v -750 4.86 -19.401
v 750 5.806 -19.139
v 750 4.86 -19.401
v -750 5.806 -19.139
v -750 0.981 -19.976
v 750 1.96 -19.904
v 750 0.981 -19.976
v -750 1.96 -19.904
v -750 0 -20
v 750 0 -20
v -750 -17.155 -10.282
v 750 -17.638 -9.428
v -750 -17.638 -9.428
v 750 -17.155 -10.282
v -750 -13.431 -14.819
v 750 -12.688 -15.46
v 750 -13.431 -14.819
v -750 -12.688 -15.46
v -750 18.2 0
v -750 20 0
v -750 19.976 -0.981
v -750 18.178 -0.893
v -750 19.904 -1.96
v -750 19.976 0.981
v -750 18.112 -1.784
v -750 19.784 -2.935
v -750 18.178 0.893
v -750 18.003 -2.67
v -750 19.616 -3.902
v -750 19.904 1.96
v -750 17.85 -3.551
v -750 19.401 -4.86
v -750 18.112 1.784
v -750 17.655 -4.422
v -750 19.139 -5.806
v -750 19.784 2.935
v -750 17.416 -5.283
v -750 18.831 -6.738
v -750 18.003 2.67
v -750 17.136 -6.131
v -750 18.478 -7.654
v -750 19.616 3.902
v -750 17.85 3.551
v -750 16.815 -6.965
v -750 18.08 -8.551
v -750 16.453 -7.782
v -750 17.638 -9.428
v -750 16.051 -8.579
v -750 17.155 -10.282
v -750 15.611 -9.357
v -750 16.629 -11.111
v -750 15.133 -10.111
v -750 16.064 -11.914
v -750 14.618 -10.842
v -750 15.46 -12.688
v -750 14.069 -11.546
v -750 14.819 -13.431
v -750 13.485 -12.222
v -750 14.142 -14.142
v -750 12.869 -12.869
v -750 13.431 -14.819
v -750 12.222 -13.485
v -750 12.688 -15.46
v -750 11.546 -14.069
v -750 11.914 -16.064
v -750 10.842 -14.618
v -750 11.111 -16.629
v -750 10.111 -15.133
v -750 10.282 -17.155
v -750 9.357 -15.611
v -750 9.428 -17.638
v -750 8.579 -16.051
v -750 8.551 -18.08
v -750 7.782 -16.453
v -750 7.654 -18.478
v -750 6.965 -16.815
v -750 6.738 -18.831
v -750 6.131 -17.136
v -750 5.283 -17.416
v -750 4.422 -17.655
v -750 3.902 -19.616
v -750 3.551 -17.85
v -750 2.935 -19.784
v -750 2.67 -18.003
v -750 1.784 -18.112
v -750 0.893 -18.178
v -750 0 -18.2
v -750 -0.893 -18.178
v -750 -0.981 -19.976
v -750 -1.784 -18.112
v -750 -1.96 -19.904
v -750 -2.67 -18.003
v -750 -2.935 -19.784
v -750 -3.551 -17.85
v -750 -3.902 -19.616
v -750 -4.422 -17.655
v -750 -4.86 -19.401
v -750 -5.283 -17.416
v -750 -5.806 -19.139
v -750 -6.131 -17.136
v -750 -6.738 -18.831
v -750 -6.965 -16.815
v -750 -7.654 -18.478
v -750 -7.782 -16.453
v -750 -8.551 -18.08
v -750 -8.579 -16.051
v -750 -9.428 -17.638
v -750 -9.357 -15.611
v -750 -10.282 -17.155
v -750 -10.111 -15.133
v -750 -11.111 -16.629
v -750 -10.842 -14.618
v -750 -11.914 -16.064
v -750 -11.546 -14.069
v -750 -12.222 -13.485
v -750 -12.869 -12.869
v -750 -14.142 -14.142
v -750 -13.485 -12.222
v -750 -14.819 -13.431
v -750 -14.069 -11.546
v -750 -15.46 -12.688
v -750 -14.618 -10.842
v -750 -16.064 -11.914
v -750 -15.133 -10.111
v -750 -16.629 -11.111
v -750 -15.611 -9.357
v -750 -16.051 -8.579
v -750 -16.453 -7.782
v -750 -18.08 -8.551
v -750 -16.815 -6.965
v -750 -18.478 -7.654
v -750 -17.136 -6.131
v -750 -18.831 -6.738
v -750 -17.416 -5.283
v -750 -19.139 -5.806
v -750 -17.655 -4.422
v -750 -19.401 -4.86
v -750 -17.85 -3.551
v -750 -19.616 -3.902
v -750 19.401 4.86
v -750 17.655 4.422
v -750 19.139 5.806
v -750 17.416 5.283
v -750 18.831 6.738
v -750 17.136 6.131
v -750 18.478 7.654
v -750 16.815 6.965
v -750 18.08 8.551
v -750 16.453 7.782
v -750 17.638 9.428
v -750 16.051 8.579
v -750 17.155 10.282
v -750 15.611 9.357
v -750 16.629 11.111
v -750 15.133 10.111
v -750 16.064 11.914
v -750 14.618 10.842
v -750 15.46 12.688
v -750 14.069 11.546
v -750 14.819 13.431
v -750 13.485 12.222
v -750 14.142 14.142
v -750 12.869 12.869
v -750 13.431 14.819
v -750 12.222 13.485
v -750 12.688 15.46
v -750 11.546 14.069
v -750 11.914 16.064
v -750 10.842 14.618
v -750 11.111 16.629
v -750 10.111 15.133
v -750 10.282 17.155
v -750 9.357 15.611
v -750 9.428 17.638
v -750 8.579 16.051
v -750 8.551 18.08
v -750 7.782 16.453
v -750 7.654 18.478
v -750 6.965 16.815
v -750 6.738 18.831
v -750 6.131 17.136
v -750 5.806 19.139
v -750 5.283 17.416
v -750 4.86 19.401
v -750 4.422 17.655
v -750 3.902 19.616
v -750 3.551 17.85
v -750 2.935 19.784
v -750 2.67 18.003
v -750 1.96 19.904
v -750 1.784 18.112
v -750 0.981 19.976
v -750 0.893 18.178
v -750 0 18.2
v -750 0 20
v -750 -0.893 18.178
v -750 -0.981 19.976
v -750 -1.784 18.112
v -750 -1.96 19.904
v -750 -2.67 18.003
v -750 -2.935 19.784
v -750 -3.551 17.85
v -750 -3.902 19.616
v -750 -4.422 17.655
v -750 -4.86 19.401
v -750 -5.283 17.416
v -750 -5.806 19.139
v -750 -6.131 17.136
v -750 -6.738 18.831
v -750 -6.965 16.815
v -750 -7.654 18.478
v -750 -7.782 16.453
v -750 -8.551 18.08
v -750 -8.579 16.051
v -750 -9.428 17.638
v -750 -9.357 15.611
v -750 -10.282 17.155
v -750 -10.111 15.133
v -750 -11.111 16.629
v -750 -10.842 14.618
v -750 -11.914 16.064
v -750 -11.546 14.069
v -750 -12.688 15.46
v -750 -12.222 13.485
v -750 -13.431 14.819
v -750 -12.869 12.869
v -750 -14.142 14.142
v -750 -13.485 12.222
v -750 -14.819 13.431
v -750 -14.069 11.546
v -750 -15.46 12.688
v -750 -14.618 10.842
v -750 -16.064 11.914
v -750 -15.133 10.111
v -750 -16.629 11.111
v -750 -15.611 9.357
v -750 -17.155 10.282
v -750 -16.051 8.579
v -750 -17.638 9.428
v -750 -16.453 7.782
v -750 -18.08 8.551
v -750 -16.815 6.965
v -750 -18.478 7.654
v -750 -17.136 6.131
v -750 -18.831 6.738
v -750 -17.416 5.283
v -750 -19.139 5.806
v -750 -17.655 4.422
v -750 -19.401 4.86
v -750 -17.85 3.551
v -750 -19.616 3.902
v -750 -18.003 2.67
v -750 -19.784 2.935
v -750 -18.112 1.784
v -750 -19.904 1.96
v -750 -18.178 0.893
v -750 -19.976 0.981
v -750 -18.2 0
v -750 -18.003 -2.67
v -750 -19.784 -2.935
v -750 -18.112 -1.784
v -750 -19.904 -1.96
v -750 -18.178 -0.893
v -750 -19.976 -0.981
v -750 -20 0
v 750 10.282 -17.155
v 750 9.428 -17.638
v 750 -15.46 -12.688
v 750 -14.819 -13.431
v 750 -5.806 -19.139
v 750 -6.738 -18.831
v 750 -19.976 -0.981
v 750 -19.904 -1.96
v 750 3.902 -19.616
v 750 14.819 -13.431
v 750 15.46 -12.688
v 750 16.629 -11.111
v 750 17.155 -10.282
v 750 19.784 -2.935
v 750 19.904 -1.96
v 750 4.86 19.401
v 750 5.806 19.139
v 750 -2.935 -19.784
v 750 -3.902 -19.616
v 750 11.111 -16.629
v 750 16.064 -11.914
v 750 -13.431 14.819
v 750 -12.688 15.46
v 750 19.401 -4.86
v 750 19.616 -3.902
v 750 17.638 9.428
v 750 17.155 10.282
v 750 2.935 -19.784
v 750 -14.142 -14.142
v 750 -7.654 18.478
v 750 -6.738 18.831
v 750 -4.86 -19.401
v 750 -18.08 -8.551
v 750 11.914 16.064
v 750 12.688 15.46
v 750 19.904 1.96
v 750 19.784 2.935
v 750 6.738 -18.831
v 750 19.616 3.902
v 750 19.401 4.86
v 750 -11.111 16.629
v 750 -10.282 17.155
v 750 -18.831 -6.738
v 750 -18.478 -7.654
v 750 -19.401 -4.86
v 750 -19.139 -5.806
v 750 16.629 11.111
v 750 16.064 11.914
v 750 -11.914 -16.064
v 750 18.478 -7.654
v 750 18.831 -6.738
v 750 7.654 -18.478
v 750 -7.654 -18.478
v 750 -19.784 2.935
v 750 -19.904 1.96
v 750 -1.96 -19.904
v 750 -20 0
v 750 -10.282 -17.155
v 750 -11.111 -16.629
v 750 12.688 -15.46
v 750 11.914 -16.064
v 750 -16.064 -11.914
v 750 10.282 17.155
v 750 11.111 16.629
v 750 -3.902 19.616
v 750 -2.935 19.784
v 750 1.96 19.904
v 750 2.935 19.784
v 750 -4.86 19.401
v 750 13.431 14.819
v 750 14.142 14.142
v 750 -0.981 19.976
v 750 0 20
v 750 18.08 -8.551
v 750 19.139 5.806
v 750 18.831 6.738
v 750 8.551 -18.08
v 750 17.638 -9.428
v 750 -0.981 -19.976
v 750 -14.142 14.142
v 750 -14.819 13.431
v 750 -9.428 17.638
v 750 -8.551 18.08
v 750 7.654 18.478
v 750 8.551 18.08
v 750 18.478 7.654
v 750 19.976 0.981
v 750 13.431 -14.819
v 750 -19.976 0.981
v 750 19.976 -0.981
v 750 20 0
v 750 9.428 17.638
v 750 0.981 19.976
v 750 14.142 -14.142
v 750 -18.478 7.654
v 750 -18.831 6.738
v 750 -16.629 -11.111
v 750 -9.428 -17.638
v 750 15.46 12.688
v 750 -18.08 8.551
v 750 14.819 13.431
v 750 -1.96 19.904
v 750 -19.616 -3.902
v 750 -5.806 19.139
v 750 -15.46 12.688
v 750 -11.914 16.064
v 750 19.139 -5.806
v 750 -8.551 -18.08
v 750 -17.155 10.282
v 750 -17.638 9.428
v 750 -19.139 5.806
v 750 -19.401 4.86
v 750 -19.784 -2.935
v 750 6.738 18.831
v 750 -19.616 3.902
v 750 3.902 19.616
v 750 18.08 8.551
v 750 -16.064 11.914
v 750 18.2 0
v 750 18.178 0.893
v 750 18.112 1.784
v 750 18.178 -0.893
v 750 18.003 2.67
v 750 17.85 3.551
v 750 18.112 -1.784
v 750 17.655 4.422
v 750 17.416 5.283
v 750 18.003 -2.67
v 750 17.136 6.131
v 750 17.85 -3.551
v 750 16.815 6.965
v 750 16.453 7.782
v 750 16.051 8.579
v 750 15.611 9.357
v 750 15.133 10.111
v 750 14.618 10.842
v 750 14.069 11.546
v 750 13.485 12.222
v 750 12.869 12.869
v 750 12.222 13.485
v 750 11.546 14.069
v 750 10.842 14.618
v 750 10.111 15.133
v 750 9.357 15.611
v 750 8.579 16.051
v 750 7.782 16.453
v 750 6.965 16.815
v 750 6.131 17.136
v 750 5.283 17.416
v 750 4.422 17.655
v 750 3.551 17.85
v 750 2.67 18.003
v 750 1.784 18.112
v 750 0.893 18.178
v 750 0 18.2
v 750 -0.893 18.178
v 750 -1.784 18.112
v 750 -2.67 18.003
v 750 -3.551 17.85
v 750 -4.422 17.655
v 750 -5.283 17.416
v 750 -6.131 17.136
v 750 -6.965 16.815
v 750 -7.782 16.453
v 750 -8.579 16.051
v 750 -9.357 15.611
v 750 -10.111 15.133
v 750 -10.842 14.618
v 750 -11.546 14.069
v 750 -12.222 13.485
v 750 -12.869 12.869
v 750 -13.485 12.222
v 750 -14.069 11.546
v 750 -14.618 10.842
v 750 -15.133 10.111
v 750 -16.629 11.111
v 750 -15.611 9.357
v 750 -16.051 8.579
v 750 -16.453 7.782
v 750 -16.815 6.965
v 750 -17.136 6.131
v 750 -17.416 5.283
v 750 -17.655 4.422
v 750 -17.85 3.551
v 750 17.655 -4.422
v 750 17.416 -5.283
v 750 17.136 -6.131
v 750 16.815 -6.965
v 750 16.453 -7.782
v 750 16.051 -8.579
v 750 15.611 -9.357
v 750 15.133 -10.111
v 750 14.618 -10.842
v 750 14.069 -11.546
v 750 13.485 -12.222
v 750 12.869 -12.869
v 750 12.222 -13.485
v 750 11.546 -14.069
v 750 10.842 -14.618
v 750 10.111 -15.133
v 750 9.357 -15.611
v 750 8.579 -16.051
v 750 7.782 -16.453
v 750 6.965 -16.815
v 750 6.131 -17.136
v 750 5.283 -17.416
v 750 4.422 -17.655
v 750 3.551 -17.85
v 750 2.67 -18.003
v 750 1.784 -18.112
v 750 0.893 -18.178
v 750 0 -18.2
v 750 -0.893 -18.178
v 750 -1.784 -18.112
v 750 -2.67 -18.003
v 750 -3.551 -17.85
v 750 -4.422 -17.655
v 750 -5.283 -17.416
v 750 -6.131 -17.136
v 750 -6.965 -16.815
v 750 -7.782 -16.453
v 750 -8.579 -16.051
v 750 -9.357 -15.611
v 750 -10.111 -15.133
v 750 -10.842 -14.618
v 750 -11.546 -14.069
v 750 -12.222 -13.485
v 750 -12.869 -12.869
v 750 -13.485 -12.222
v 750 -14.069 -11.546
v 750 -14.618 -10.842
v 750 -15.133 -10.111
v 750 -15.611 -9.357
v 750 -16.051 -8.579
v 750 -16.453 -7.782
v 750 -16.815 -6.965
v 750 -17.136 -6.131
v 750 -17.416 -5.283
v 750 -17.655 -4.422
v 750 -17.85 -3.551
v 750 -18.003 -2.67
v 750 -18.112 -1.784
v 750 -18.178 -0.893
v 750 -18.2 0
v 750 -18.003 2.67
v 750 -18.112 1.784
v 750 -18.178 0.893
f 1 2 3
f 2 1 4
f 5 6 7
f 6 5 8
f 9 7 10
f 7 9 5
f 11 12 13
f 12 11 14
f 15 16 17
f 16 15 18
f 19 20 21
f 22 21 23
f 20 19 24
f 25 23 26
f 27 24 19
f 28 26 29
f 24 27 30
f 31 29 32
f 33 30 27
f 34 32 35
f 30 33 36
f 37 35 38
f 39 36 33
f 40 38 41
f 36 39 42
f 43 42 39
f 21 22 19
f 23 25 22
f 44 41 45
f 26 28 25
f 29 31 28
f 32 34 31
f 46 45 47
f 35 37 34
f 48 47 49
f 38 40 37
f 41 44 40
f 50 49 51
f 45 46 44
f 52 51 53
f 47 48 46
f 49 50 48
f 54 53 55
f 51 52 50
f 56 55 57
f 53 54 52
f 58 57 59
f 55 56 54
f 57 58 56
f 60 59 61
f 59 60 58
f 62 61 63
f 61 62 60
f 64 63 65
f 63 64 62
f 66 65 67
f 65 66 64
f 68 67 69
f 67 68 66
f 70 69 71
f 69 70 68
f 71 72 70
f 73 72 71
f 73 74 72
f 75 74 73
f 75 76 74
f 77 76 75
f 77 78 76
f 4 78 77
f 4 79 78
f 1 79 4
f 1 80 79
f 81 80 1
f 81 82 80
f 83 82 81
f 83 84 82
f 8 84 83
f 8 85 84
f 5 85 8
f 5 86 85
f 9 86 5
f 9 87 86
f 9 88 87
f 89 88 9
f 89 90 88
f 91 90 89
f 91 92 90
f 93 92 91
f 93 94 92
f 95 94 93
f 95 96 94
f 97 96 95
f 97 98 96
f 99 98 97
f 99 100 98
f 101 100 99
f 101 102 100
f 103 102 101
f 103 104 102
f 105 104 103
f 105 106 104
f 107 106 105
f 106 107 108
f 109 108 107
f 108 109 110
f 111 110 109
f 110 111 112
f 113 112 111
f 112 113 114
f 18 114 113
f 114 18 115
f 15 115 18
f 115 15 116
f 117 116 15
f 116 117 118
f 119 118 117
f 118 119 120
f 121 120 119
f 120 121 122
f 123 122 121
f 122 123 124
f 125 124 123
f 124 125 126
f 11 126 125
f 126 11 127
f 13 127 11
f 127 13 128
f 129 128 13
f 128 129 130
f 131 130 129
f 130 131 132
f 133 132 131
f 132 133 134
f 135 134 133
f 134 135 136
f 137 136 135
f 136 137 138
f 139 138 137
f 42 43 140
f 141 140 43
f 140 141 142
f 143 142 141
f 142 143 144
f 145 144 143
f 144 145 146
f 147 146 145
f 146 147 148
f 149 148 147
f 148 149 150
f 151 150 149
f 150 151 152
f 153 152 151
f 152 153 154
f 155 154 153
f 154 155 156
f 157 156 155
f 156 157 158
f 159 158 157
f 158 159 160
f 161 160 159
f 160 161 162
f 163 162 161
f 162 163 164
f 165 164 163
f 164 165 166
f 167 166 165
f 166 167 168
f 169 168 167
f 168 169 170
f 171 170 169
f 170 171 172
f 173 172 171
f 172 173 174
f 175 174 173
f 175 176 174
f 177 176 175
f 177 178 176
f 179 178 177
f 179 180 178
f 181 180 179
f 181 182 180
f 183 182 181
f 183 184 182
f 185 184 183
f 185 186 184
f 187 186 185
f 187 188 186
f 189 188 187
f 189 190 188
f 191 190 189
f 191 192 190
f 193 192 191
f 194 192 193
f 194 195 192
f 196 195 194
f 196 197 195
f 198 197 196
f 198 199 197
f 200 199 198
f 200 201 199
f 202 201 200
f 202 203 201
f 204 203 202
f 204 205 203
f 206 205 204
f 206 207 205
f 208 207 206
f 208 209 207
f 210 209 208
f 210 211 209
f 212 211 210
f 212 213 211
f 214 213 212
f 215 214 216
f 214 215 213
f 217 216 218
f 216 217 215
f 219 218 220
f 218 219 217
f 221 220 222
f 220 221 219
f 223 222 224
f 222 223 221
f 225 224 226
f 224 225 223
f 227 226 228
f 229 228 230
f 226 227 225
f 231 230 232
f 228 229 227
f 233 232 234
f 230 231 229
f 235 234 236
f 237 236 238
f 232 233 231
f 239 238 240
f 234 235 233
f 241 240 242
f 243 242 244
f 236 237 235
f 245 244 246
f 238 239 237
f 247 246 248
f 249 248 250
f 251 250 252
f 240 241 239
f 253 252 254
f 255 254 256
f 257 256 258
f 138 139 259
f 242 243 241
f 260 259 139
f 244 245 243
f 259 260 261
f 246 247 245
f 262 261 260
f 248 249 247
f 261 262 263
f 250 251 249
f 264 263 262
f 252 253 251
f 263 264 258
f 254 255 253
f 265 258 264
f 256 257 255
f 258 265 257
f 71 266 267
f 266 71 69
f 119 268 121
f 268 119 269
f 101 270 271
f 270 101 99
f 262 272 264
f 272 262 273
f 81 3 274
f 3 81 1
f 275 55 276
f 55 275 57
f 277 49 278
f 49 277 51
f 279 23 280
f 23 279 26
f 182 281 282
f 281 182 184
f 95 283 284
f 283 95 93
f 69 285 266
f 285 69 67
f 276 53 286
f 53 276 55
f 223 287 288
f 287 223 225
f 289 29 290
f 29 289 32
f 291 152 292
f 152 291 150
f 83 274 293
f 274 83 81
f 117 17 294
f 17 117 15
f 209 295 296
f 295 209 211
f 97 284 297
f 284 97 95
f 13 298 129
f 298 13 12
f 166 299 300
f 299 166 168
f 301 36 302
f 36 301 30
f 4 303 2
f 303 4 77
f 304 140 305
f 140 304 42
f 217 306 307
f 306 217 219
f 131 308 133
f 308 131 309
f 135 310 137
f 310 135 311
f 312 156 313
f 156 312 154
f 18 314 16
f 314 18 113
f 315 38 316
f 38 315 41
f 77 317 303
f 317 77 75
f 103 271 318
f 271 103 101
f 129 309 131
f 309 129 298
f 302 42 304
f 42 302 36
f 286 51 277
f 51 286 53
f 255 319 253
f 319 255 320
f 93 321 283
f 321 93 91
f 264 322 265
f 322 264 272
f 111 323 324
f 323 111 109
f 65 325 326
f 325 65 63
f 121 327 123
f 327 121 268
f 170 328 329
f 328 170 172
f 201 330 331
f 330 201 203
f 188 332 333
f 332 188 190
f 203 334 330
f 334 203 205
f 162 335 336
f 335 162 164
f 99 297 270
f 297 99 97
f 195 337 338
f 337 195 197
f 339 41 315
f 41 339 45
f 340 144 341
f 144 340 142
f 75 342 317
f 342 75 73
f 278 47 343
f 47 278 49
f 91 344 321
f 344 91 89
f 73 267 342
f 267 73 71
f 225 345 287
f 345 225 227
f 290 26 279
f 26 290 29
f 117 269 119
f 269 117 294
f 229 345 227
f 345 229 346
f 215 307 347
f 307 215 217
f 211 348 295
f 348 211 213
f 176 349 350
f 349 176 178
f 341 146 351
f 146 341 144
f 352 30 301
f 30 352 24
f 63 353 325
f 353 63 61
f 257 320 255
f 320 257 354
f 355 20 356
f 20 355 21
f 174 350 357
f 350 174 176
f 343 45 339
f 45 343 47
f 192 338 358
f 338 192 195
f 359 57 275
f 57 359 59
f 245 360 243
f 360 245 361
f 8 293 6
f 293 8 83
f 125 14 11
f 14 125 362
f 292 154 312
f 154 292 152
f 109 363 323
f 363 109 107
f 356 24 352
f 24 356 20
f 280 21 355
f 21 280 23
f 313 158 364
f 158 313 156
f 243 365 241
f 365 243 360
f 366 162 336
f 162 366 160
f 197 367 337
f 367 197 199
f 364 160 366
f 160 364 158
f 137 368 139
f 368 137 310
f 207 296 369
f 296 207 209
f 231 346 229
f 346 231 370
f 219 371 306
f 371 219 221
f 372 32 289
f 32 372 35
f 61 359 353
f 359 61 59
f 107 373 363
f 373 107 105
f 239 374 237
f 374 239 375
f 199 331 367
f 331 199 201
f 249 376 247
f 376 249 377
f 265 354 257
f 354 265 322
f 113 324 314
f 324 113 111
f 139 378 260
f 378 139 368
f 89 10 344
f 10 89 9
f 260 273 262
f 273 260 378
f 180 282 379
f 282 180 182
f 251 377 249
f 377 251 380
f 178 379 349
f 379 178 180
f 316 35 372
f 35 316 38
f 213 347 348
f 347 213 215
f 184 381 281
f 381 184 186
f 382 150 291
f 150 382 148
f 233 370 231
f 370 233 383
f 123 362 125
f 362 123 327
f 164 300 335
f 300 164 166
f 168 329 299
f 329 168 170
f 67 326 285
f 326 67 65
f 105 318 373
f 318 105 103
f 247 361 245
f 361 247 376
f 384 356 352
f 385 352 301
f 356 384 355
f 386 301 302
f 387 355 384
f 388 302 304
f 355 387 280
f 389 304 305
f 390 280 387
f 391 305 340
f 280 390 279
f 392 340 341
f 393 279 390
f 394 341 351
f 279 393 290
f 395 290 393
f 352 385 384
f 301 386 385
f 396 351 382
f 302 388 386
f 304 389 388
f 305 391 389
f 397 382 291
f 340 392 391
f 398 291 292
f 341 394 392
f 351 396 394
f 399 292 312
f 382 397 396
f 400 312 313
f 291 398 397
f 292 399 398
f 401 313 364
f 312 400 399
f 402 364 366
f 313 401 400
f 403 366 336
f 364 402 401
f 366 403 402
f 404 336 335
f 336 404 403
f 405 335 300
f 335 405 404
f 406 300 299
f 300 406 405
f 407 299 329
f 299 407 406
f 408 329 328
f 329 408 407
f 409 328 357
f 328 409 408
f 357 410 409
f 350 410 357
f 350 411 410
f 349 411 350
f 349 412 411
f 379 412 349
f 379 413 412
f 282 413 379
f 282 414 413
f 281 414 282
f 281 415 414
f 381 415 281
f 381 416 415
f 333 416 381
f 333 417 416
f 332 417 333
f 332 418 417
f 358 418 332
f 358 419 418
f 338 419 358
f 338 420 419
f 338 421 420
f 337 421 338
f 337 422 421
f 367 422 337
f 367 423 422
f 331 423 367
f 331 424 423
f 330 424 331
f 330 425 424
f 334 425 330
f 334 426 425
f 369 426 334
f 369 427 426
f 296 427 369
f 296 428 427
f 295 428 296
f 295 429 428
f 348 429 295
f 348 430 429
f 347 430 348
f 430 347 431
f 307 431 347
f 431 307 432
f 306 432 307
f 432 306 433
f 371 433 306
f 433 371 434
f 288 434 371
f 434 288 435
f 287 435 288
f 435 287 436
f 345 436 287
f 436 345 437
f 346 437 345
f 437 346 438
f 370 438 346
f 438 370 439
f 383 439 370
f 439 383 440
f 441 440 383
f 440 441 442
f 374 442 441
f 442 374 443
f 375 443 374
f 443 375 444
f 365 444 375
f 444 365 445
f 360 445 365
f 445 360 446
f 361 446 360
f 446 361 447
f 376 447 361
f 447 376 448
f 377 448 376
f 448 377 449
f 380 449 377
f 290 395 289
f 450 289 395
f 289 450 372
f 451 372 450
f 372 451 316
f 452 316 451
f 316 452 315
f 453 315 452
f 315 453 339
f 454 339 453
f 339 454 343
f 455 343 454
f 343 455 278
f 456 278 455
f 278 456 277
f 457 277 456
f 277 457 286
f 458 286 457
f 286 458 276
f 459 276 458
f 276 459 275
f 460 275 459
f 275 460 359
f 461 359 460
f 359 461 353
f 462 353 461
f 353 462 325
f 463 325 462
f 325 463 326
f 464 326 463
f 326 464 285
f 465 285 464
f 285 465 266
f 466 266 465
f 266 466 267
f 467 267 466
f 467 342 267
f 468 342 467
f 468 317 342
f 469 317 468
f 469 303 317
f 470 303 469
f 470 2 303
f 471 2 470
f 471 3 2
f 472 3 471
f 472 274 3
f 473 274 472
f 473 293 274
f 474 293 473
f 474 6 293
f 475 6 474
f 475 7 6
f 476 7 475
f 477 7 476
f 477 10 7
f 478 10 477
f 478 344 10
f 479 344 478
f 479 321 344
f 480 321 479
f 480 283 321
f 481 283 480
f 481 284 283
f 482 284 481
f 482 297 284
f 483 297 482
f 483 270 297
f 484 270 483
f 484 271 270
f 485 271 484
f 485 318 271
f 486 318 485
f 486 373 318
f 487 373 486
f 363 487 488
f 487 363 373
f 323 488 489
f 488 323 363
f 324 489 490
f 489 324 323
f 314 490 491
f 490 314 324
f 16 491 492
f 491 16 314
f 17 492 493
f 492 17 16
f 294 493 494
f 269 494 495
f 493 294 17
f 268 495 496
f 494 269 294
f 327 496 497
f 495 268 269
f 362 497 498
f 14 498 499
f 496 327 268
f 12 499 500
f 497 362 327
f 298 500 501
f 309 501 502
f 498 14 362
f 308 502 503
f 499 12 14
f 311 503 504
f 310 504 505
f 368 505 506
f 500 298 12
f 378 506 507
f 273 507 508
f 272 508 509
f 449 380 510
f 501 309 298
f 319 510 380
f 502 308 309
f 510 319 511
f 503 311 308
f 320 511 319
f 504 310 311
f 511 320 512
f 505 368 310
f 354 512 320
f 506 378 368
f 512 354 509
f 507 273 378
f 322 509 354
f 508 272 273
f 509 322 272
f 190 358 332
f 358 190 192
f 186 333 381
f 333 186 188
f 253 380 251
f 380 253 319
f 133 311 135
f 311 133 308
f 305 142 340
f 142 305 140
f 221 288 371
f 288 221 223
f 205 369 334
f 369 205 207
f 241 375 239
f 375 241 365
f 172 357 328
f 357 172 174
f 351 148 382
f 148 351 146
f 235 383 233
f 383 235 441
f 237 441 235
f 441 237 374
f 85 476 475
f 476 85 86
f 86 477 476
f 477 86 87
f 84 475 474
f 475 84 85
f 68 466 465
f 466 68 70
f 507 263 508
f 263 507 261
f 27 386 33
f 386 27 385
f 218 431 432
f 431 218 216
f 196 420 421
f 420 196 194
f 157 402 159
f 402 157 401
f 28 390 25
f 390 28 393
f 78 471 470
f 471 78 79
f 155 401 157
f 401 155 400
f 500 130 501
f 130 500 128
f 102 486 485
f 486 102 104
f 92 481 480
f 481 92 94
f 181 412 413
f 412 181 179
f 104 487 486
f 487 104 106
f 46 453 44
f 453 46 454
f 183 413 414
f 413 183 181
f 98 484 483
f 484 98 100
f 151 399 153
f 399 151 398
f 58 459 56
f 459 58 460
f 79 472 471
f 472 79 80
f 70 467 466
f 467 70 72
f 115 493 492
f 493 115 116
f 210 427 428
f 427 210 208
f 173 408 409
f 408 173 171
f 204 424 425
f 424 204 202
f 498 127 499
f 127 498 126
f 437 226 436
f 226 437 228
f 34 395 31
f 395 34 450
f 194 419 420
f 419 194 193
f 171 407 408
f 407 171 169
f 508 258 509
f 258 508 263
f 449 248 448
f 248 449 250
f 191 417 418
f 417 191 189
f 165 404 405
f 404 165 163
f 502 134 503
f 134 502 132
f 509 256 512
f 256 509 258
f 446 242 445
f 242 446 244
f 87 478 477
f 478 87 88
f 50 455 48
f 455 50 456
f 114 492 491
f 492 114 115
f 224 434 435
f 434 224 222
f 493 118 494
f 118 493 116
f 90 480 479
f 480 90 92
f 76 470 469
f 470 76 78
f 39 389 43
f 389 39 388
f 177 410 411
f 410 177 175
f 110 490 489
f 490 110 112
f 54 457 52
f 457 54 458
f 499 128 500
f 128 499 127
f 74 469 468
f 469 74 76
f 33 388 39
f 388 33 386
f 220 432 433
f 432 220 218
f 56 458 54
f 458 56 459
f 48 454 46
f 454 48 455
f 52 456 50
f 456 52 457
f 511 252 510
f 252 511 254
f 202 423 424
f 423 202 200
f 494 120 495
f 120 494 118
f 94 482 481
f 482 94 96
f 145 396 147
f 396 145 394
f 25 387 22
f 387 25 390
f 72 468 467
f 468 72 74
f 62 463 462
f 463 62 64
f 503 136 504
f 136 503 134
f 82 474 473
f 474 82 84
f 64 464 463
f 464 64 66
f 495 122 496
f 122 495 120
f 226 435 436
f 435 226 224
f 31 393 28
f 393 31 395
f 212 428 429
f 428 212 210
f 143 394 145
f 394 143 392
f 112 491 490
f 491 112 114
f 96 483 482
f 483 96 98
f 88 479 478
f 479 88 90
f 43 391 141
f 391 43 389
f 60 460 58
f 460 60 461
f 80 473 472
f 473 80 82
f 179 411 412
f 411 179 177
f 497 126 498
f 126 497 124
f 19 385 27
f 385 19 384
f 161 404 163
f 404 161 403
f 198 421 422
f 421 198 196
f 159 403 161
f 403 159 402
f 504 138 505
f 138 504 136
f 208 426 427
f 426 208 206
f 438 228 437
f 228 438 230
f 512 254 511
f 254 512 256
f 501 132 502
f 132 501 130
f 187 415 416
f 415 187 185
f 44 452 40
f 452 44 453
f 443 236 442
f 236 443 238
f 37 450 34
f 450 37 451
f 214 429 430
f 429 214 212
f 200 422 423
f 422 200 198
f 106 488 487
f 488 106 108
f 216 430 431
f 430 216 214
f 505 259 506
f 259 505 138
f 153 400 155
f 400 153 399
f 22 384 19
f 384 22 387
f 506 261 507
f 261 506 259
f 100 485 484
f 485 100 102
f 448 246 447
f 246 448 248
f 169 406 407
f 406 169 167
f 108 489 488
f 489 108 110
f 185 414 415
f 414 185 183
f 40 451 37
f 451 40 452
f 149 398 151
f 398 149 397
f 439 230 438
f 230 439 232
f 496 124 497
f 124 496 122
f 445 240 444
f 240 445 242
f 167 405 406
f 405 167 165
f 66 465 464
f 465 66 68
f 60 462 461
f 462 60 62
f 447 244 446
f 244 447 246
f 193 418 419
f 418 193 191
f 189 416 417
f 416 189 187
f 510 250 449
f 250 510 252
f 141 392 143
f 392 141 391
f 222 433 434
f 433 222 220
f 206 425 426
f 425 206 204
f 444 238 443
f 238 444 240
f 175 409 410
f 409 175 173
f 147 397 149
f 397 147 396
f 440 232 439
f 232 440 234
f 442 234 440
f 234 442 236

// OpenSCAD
$fn = 128;

// HT 40 pipe (approx.): OD 40 mm, wall 1.8 mm, length 1500 mm
od = 40;
wall = 1.8;
len = 1500;

module ht_pipe(od, wall, len) {
    eps = 0.2; // overlap to avoid coplanar artifacts
    id = od - 2*wall;

    // Place pipe along X so front/back/left/right views show the full 1500 mm length
    rotate([0, 90, 0])
        difference() {
            cylinder(h=len, d=od, center=true);
            cylinder(h=len + 2*eps, d=id, center=true);
        }
}

ht_pipe(od, wall, len);
